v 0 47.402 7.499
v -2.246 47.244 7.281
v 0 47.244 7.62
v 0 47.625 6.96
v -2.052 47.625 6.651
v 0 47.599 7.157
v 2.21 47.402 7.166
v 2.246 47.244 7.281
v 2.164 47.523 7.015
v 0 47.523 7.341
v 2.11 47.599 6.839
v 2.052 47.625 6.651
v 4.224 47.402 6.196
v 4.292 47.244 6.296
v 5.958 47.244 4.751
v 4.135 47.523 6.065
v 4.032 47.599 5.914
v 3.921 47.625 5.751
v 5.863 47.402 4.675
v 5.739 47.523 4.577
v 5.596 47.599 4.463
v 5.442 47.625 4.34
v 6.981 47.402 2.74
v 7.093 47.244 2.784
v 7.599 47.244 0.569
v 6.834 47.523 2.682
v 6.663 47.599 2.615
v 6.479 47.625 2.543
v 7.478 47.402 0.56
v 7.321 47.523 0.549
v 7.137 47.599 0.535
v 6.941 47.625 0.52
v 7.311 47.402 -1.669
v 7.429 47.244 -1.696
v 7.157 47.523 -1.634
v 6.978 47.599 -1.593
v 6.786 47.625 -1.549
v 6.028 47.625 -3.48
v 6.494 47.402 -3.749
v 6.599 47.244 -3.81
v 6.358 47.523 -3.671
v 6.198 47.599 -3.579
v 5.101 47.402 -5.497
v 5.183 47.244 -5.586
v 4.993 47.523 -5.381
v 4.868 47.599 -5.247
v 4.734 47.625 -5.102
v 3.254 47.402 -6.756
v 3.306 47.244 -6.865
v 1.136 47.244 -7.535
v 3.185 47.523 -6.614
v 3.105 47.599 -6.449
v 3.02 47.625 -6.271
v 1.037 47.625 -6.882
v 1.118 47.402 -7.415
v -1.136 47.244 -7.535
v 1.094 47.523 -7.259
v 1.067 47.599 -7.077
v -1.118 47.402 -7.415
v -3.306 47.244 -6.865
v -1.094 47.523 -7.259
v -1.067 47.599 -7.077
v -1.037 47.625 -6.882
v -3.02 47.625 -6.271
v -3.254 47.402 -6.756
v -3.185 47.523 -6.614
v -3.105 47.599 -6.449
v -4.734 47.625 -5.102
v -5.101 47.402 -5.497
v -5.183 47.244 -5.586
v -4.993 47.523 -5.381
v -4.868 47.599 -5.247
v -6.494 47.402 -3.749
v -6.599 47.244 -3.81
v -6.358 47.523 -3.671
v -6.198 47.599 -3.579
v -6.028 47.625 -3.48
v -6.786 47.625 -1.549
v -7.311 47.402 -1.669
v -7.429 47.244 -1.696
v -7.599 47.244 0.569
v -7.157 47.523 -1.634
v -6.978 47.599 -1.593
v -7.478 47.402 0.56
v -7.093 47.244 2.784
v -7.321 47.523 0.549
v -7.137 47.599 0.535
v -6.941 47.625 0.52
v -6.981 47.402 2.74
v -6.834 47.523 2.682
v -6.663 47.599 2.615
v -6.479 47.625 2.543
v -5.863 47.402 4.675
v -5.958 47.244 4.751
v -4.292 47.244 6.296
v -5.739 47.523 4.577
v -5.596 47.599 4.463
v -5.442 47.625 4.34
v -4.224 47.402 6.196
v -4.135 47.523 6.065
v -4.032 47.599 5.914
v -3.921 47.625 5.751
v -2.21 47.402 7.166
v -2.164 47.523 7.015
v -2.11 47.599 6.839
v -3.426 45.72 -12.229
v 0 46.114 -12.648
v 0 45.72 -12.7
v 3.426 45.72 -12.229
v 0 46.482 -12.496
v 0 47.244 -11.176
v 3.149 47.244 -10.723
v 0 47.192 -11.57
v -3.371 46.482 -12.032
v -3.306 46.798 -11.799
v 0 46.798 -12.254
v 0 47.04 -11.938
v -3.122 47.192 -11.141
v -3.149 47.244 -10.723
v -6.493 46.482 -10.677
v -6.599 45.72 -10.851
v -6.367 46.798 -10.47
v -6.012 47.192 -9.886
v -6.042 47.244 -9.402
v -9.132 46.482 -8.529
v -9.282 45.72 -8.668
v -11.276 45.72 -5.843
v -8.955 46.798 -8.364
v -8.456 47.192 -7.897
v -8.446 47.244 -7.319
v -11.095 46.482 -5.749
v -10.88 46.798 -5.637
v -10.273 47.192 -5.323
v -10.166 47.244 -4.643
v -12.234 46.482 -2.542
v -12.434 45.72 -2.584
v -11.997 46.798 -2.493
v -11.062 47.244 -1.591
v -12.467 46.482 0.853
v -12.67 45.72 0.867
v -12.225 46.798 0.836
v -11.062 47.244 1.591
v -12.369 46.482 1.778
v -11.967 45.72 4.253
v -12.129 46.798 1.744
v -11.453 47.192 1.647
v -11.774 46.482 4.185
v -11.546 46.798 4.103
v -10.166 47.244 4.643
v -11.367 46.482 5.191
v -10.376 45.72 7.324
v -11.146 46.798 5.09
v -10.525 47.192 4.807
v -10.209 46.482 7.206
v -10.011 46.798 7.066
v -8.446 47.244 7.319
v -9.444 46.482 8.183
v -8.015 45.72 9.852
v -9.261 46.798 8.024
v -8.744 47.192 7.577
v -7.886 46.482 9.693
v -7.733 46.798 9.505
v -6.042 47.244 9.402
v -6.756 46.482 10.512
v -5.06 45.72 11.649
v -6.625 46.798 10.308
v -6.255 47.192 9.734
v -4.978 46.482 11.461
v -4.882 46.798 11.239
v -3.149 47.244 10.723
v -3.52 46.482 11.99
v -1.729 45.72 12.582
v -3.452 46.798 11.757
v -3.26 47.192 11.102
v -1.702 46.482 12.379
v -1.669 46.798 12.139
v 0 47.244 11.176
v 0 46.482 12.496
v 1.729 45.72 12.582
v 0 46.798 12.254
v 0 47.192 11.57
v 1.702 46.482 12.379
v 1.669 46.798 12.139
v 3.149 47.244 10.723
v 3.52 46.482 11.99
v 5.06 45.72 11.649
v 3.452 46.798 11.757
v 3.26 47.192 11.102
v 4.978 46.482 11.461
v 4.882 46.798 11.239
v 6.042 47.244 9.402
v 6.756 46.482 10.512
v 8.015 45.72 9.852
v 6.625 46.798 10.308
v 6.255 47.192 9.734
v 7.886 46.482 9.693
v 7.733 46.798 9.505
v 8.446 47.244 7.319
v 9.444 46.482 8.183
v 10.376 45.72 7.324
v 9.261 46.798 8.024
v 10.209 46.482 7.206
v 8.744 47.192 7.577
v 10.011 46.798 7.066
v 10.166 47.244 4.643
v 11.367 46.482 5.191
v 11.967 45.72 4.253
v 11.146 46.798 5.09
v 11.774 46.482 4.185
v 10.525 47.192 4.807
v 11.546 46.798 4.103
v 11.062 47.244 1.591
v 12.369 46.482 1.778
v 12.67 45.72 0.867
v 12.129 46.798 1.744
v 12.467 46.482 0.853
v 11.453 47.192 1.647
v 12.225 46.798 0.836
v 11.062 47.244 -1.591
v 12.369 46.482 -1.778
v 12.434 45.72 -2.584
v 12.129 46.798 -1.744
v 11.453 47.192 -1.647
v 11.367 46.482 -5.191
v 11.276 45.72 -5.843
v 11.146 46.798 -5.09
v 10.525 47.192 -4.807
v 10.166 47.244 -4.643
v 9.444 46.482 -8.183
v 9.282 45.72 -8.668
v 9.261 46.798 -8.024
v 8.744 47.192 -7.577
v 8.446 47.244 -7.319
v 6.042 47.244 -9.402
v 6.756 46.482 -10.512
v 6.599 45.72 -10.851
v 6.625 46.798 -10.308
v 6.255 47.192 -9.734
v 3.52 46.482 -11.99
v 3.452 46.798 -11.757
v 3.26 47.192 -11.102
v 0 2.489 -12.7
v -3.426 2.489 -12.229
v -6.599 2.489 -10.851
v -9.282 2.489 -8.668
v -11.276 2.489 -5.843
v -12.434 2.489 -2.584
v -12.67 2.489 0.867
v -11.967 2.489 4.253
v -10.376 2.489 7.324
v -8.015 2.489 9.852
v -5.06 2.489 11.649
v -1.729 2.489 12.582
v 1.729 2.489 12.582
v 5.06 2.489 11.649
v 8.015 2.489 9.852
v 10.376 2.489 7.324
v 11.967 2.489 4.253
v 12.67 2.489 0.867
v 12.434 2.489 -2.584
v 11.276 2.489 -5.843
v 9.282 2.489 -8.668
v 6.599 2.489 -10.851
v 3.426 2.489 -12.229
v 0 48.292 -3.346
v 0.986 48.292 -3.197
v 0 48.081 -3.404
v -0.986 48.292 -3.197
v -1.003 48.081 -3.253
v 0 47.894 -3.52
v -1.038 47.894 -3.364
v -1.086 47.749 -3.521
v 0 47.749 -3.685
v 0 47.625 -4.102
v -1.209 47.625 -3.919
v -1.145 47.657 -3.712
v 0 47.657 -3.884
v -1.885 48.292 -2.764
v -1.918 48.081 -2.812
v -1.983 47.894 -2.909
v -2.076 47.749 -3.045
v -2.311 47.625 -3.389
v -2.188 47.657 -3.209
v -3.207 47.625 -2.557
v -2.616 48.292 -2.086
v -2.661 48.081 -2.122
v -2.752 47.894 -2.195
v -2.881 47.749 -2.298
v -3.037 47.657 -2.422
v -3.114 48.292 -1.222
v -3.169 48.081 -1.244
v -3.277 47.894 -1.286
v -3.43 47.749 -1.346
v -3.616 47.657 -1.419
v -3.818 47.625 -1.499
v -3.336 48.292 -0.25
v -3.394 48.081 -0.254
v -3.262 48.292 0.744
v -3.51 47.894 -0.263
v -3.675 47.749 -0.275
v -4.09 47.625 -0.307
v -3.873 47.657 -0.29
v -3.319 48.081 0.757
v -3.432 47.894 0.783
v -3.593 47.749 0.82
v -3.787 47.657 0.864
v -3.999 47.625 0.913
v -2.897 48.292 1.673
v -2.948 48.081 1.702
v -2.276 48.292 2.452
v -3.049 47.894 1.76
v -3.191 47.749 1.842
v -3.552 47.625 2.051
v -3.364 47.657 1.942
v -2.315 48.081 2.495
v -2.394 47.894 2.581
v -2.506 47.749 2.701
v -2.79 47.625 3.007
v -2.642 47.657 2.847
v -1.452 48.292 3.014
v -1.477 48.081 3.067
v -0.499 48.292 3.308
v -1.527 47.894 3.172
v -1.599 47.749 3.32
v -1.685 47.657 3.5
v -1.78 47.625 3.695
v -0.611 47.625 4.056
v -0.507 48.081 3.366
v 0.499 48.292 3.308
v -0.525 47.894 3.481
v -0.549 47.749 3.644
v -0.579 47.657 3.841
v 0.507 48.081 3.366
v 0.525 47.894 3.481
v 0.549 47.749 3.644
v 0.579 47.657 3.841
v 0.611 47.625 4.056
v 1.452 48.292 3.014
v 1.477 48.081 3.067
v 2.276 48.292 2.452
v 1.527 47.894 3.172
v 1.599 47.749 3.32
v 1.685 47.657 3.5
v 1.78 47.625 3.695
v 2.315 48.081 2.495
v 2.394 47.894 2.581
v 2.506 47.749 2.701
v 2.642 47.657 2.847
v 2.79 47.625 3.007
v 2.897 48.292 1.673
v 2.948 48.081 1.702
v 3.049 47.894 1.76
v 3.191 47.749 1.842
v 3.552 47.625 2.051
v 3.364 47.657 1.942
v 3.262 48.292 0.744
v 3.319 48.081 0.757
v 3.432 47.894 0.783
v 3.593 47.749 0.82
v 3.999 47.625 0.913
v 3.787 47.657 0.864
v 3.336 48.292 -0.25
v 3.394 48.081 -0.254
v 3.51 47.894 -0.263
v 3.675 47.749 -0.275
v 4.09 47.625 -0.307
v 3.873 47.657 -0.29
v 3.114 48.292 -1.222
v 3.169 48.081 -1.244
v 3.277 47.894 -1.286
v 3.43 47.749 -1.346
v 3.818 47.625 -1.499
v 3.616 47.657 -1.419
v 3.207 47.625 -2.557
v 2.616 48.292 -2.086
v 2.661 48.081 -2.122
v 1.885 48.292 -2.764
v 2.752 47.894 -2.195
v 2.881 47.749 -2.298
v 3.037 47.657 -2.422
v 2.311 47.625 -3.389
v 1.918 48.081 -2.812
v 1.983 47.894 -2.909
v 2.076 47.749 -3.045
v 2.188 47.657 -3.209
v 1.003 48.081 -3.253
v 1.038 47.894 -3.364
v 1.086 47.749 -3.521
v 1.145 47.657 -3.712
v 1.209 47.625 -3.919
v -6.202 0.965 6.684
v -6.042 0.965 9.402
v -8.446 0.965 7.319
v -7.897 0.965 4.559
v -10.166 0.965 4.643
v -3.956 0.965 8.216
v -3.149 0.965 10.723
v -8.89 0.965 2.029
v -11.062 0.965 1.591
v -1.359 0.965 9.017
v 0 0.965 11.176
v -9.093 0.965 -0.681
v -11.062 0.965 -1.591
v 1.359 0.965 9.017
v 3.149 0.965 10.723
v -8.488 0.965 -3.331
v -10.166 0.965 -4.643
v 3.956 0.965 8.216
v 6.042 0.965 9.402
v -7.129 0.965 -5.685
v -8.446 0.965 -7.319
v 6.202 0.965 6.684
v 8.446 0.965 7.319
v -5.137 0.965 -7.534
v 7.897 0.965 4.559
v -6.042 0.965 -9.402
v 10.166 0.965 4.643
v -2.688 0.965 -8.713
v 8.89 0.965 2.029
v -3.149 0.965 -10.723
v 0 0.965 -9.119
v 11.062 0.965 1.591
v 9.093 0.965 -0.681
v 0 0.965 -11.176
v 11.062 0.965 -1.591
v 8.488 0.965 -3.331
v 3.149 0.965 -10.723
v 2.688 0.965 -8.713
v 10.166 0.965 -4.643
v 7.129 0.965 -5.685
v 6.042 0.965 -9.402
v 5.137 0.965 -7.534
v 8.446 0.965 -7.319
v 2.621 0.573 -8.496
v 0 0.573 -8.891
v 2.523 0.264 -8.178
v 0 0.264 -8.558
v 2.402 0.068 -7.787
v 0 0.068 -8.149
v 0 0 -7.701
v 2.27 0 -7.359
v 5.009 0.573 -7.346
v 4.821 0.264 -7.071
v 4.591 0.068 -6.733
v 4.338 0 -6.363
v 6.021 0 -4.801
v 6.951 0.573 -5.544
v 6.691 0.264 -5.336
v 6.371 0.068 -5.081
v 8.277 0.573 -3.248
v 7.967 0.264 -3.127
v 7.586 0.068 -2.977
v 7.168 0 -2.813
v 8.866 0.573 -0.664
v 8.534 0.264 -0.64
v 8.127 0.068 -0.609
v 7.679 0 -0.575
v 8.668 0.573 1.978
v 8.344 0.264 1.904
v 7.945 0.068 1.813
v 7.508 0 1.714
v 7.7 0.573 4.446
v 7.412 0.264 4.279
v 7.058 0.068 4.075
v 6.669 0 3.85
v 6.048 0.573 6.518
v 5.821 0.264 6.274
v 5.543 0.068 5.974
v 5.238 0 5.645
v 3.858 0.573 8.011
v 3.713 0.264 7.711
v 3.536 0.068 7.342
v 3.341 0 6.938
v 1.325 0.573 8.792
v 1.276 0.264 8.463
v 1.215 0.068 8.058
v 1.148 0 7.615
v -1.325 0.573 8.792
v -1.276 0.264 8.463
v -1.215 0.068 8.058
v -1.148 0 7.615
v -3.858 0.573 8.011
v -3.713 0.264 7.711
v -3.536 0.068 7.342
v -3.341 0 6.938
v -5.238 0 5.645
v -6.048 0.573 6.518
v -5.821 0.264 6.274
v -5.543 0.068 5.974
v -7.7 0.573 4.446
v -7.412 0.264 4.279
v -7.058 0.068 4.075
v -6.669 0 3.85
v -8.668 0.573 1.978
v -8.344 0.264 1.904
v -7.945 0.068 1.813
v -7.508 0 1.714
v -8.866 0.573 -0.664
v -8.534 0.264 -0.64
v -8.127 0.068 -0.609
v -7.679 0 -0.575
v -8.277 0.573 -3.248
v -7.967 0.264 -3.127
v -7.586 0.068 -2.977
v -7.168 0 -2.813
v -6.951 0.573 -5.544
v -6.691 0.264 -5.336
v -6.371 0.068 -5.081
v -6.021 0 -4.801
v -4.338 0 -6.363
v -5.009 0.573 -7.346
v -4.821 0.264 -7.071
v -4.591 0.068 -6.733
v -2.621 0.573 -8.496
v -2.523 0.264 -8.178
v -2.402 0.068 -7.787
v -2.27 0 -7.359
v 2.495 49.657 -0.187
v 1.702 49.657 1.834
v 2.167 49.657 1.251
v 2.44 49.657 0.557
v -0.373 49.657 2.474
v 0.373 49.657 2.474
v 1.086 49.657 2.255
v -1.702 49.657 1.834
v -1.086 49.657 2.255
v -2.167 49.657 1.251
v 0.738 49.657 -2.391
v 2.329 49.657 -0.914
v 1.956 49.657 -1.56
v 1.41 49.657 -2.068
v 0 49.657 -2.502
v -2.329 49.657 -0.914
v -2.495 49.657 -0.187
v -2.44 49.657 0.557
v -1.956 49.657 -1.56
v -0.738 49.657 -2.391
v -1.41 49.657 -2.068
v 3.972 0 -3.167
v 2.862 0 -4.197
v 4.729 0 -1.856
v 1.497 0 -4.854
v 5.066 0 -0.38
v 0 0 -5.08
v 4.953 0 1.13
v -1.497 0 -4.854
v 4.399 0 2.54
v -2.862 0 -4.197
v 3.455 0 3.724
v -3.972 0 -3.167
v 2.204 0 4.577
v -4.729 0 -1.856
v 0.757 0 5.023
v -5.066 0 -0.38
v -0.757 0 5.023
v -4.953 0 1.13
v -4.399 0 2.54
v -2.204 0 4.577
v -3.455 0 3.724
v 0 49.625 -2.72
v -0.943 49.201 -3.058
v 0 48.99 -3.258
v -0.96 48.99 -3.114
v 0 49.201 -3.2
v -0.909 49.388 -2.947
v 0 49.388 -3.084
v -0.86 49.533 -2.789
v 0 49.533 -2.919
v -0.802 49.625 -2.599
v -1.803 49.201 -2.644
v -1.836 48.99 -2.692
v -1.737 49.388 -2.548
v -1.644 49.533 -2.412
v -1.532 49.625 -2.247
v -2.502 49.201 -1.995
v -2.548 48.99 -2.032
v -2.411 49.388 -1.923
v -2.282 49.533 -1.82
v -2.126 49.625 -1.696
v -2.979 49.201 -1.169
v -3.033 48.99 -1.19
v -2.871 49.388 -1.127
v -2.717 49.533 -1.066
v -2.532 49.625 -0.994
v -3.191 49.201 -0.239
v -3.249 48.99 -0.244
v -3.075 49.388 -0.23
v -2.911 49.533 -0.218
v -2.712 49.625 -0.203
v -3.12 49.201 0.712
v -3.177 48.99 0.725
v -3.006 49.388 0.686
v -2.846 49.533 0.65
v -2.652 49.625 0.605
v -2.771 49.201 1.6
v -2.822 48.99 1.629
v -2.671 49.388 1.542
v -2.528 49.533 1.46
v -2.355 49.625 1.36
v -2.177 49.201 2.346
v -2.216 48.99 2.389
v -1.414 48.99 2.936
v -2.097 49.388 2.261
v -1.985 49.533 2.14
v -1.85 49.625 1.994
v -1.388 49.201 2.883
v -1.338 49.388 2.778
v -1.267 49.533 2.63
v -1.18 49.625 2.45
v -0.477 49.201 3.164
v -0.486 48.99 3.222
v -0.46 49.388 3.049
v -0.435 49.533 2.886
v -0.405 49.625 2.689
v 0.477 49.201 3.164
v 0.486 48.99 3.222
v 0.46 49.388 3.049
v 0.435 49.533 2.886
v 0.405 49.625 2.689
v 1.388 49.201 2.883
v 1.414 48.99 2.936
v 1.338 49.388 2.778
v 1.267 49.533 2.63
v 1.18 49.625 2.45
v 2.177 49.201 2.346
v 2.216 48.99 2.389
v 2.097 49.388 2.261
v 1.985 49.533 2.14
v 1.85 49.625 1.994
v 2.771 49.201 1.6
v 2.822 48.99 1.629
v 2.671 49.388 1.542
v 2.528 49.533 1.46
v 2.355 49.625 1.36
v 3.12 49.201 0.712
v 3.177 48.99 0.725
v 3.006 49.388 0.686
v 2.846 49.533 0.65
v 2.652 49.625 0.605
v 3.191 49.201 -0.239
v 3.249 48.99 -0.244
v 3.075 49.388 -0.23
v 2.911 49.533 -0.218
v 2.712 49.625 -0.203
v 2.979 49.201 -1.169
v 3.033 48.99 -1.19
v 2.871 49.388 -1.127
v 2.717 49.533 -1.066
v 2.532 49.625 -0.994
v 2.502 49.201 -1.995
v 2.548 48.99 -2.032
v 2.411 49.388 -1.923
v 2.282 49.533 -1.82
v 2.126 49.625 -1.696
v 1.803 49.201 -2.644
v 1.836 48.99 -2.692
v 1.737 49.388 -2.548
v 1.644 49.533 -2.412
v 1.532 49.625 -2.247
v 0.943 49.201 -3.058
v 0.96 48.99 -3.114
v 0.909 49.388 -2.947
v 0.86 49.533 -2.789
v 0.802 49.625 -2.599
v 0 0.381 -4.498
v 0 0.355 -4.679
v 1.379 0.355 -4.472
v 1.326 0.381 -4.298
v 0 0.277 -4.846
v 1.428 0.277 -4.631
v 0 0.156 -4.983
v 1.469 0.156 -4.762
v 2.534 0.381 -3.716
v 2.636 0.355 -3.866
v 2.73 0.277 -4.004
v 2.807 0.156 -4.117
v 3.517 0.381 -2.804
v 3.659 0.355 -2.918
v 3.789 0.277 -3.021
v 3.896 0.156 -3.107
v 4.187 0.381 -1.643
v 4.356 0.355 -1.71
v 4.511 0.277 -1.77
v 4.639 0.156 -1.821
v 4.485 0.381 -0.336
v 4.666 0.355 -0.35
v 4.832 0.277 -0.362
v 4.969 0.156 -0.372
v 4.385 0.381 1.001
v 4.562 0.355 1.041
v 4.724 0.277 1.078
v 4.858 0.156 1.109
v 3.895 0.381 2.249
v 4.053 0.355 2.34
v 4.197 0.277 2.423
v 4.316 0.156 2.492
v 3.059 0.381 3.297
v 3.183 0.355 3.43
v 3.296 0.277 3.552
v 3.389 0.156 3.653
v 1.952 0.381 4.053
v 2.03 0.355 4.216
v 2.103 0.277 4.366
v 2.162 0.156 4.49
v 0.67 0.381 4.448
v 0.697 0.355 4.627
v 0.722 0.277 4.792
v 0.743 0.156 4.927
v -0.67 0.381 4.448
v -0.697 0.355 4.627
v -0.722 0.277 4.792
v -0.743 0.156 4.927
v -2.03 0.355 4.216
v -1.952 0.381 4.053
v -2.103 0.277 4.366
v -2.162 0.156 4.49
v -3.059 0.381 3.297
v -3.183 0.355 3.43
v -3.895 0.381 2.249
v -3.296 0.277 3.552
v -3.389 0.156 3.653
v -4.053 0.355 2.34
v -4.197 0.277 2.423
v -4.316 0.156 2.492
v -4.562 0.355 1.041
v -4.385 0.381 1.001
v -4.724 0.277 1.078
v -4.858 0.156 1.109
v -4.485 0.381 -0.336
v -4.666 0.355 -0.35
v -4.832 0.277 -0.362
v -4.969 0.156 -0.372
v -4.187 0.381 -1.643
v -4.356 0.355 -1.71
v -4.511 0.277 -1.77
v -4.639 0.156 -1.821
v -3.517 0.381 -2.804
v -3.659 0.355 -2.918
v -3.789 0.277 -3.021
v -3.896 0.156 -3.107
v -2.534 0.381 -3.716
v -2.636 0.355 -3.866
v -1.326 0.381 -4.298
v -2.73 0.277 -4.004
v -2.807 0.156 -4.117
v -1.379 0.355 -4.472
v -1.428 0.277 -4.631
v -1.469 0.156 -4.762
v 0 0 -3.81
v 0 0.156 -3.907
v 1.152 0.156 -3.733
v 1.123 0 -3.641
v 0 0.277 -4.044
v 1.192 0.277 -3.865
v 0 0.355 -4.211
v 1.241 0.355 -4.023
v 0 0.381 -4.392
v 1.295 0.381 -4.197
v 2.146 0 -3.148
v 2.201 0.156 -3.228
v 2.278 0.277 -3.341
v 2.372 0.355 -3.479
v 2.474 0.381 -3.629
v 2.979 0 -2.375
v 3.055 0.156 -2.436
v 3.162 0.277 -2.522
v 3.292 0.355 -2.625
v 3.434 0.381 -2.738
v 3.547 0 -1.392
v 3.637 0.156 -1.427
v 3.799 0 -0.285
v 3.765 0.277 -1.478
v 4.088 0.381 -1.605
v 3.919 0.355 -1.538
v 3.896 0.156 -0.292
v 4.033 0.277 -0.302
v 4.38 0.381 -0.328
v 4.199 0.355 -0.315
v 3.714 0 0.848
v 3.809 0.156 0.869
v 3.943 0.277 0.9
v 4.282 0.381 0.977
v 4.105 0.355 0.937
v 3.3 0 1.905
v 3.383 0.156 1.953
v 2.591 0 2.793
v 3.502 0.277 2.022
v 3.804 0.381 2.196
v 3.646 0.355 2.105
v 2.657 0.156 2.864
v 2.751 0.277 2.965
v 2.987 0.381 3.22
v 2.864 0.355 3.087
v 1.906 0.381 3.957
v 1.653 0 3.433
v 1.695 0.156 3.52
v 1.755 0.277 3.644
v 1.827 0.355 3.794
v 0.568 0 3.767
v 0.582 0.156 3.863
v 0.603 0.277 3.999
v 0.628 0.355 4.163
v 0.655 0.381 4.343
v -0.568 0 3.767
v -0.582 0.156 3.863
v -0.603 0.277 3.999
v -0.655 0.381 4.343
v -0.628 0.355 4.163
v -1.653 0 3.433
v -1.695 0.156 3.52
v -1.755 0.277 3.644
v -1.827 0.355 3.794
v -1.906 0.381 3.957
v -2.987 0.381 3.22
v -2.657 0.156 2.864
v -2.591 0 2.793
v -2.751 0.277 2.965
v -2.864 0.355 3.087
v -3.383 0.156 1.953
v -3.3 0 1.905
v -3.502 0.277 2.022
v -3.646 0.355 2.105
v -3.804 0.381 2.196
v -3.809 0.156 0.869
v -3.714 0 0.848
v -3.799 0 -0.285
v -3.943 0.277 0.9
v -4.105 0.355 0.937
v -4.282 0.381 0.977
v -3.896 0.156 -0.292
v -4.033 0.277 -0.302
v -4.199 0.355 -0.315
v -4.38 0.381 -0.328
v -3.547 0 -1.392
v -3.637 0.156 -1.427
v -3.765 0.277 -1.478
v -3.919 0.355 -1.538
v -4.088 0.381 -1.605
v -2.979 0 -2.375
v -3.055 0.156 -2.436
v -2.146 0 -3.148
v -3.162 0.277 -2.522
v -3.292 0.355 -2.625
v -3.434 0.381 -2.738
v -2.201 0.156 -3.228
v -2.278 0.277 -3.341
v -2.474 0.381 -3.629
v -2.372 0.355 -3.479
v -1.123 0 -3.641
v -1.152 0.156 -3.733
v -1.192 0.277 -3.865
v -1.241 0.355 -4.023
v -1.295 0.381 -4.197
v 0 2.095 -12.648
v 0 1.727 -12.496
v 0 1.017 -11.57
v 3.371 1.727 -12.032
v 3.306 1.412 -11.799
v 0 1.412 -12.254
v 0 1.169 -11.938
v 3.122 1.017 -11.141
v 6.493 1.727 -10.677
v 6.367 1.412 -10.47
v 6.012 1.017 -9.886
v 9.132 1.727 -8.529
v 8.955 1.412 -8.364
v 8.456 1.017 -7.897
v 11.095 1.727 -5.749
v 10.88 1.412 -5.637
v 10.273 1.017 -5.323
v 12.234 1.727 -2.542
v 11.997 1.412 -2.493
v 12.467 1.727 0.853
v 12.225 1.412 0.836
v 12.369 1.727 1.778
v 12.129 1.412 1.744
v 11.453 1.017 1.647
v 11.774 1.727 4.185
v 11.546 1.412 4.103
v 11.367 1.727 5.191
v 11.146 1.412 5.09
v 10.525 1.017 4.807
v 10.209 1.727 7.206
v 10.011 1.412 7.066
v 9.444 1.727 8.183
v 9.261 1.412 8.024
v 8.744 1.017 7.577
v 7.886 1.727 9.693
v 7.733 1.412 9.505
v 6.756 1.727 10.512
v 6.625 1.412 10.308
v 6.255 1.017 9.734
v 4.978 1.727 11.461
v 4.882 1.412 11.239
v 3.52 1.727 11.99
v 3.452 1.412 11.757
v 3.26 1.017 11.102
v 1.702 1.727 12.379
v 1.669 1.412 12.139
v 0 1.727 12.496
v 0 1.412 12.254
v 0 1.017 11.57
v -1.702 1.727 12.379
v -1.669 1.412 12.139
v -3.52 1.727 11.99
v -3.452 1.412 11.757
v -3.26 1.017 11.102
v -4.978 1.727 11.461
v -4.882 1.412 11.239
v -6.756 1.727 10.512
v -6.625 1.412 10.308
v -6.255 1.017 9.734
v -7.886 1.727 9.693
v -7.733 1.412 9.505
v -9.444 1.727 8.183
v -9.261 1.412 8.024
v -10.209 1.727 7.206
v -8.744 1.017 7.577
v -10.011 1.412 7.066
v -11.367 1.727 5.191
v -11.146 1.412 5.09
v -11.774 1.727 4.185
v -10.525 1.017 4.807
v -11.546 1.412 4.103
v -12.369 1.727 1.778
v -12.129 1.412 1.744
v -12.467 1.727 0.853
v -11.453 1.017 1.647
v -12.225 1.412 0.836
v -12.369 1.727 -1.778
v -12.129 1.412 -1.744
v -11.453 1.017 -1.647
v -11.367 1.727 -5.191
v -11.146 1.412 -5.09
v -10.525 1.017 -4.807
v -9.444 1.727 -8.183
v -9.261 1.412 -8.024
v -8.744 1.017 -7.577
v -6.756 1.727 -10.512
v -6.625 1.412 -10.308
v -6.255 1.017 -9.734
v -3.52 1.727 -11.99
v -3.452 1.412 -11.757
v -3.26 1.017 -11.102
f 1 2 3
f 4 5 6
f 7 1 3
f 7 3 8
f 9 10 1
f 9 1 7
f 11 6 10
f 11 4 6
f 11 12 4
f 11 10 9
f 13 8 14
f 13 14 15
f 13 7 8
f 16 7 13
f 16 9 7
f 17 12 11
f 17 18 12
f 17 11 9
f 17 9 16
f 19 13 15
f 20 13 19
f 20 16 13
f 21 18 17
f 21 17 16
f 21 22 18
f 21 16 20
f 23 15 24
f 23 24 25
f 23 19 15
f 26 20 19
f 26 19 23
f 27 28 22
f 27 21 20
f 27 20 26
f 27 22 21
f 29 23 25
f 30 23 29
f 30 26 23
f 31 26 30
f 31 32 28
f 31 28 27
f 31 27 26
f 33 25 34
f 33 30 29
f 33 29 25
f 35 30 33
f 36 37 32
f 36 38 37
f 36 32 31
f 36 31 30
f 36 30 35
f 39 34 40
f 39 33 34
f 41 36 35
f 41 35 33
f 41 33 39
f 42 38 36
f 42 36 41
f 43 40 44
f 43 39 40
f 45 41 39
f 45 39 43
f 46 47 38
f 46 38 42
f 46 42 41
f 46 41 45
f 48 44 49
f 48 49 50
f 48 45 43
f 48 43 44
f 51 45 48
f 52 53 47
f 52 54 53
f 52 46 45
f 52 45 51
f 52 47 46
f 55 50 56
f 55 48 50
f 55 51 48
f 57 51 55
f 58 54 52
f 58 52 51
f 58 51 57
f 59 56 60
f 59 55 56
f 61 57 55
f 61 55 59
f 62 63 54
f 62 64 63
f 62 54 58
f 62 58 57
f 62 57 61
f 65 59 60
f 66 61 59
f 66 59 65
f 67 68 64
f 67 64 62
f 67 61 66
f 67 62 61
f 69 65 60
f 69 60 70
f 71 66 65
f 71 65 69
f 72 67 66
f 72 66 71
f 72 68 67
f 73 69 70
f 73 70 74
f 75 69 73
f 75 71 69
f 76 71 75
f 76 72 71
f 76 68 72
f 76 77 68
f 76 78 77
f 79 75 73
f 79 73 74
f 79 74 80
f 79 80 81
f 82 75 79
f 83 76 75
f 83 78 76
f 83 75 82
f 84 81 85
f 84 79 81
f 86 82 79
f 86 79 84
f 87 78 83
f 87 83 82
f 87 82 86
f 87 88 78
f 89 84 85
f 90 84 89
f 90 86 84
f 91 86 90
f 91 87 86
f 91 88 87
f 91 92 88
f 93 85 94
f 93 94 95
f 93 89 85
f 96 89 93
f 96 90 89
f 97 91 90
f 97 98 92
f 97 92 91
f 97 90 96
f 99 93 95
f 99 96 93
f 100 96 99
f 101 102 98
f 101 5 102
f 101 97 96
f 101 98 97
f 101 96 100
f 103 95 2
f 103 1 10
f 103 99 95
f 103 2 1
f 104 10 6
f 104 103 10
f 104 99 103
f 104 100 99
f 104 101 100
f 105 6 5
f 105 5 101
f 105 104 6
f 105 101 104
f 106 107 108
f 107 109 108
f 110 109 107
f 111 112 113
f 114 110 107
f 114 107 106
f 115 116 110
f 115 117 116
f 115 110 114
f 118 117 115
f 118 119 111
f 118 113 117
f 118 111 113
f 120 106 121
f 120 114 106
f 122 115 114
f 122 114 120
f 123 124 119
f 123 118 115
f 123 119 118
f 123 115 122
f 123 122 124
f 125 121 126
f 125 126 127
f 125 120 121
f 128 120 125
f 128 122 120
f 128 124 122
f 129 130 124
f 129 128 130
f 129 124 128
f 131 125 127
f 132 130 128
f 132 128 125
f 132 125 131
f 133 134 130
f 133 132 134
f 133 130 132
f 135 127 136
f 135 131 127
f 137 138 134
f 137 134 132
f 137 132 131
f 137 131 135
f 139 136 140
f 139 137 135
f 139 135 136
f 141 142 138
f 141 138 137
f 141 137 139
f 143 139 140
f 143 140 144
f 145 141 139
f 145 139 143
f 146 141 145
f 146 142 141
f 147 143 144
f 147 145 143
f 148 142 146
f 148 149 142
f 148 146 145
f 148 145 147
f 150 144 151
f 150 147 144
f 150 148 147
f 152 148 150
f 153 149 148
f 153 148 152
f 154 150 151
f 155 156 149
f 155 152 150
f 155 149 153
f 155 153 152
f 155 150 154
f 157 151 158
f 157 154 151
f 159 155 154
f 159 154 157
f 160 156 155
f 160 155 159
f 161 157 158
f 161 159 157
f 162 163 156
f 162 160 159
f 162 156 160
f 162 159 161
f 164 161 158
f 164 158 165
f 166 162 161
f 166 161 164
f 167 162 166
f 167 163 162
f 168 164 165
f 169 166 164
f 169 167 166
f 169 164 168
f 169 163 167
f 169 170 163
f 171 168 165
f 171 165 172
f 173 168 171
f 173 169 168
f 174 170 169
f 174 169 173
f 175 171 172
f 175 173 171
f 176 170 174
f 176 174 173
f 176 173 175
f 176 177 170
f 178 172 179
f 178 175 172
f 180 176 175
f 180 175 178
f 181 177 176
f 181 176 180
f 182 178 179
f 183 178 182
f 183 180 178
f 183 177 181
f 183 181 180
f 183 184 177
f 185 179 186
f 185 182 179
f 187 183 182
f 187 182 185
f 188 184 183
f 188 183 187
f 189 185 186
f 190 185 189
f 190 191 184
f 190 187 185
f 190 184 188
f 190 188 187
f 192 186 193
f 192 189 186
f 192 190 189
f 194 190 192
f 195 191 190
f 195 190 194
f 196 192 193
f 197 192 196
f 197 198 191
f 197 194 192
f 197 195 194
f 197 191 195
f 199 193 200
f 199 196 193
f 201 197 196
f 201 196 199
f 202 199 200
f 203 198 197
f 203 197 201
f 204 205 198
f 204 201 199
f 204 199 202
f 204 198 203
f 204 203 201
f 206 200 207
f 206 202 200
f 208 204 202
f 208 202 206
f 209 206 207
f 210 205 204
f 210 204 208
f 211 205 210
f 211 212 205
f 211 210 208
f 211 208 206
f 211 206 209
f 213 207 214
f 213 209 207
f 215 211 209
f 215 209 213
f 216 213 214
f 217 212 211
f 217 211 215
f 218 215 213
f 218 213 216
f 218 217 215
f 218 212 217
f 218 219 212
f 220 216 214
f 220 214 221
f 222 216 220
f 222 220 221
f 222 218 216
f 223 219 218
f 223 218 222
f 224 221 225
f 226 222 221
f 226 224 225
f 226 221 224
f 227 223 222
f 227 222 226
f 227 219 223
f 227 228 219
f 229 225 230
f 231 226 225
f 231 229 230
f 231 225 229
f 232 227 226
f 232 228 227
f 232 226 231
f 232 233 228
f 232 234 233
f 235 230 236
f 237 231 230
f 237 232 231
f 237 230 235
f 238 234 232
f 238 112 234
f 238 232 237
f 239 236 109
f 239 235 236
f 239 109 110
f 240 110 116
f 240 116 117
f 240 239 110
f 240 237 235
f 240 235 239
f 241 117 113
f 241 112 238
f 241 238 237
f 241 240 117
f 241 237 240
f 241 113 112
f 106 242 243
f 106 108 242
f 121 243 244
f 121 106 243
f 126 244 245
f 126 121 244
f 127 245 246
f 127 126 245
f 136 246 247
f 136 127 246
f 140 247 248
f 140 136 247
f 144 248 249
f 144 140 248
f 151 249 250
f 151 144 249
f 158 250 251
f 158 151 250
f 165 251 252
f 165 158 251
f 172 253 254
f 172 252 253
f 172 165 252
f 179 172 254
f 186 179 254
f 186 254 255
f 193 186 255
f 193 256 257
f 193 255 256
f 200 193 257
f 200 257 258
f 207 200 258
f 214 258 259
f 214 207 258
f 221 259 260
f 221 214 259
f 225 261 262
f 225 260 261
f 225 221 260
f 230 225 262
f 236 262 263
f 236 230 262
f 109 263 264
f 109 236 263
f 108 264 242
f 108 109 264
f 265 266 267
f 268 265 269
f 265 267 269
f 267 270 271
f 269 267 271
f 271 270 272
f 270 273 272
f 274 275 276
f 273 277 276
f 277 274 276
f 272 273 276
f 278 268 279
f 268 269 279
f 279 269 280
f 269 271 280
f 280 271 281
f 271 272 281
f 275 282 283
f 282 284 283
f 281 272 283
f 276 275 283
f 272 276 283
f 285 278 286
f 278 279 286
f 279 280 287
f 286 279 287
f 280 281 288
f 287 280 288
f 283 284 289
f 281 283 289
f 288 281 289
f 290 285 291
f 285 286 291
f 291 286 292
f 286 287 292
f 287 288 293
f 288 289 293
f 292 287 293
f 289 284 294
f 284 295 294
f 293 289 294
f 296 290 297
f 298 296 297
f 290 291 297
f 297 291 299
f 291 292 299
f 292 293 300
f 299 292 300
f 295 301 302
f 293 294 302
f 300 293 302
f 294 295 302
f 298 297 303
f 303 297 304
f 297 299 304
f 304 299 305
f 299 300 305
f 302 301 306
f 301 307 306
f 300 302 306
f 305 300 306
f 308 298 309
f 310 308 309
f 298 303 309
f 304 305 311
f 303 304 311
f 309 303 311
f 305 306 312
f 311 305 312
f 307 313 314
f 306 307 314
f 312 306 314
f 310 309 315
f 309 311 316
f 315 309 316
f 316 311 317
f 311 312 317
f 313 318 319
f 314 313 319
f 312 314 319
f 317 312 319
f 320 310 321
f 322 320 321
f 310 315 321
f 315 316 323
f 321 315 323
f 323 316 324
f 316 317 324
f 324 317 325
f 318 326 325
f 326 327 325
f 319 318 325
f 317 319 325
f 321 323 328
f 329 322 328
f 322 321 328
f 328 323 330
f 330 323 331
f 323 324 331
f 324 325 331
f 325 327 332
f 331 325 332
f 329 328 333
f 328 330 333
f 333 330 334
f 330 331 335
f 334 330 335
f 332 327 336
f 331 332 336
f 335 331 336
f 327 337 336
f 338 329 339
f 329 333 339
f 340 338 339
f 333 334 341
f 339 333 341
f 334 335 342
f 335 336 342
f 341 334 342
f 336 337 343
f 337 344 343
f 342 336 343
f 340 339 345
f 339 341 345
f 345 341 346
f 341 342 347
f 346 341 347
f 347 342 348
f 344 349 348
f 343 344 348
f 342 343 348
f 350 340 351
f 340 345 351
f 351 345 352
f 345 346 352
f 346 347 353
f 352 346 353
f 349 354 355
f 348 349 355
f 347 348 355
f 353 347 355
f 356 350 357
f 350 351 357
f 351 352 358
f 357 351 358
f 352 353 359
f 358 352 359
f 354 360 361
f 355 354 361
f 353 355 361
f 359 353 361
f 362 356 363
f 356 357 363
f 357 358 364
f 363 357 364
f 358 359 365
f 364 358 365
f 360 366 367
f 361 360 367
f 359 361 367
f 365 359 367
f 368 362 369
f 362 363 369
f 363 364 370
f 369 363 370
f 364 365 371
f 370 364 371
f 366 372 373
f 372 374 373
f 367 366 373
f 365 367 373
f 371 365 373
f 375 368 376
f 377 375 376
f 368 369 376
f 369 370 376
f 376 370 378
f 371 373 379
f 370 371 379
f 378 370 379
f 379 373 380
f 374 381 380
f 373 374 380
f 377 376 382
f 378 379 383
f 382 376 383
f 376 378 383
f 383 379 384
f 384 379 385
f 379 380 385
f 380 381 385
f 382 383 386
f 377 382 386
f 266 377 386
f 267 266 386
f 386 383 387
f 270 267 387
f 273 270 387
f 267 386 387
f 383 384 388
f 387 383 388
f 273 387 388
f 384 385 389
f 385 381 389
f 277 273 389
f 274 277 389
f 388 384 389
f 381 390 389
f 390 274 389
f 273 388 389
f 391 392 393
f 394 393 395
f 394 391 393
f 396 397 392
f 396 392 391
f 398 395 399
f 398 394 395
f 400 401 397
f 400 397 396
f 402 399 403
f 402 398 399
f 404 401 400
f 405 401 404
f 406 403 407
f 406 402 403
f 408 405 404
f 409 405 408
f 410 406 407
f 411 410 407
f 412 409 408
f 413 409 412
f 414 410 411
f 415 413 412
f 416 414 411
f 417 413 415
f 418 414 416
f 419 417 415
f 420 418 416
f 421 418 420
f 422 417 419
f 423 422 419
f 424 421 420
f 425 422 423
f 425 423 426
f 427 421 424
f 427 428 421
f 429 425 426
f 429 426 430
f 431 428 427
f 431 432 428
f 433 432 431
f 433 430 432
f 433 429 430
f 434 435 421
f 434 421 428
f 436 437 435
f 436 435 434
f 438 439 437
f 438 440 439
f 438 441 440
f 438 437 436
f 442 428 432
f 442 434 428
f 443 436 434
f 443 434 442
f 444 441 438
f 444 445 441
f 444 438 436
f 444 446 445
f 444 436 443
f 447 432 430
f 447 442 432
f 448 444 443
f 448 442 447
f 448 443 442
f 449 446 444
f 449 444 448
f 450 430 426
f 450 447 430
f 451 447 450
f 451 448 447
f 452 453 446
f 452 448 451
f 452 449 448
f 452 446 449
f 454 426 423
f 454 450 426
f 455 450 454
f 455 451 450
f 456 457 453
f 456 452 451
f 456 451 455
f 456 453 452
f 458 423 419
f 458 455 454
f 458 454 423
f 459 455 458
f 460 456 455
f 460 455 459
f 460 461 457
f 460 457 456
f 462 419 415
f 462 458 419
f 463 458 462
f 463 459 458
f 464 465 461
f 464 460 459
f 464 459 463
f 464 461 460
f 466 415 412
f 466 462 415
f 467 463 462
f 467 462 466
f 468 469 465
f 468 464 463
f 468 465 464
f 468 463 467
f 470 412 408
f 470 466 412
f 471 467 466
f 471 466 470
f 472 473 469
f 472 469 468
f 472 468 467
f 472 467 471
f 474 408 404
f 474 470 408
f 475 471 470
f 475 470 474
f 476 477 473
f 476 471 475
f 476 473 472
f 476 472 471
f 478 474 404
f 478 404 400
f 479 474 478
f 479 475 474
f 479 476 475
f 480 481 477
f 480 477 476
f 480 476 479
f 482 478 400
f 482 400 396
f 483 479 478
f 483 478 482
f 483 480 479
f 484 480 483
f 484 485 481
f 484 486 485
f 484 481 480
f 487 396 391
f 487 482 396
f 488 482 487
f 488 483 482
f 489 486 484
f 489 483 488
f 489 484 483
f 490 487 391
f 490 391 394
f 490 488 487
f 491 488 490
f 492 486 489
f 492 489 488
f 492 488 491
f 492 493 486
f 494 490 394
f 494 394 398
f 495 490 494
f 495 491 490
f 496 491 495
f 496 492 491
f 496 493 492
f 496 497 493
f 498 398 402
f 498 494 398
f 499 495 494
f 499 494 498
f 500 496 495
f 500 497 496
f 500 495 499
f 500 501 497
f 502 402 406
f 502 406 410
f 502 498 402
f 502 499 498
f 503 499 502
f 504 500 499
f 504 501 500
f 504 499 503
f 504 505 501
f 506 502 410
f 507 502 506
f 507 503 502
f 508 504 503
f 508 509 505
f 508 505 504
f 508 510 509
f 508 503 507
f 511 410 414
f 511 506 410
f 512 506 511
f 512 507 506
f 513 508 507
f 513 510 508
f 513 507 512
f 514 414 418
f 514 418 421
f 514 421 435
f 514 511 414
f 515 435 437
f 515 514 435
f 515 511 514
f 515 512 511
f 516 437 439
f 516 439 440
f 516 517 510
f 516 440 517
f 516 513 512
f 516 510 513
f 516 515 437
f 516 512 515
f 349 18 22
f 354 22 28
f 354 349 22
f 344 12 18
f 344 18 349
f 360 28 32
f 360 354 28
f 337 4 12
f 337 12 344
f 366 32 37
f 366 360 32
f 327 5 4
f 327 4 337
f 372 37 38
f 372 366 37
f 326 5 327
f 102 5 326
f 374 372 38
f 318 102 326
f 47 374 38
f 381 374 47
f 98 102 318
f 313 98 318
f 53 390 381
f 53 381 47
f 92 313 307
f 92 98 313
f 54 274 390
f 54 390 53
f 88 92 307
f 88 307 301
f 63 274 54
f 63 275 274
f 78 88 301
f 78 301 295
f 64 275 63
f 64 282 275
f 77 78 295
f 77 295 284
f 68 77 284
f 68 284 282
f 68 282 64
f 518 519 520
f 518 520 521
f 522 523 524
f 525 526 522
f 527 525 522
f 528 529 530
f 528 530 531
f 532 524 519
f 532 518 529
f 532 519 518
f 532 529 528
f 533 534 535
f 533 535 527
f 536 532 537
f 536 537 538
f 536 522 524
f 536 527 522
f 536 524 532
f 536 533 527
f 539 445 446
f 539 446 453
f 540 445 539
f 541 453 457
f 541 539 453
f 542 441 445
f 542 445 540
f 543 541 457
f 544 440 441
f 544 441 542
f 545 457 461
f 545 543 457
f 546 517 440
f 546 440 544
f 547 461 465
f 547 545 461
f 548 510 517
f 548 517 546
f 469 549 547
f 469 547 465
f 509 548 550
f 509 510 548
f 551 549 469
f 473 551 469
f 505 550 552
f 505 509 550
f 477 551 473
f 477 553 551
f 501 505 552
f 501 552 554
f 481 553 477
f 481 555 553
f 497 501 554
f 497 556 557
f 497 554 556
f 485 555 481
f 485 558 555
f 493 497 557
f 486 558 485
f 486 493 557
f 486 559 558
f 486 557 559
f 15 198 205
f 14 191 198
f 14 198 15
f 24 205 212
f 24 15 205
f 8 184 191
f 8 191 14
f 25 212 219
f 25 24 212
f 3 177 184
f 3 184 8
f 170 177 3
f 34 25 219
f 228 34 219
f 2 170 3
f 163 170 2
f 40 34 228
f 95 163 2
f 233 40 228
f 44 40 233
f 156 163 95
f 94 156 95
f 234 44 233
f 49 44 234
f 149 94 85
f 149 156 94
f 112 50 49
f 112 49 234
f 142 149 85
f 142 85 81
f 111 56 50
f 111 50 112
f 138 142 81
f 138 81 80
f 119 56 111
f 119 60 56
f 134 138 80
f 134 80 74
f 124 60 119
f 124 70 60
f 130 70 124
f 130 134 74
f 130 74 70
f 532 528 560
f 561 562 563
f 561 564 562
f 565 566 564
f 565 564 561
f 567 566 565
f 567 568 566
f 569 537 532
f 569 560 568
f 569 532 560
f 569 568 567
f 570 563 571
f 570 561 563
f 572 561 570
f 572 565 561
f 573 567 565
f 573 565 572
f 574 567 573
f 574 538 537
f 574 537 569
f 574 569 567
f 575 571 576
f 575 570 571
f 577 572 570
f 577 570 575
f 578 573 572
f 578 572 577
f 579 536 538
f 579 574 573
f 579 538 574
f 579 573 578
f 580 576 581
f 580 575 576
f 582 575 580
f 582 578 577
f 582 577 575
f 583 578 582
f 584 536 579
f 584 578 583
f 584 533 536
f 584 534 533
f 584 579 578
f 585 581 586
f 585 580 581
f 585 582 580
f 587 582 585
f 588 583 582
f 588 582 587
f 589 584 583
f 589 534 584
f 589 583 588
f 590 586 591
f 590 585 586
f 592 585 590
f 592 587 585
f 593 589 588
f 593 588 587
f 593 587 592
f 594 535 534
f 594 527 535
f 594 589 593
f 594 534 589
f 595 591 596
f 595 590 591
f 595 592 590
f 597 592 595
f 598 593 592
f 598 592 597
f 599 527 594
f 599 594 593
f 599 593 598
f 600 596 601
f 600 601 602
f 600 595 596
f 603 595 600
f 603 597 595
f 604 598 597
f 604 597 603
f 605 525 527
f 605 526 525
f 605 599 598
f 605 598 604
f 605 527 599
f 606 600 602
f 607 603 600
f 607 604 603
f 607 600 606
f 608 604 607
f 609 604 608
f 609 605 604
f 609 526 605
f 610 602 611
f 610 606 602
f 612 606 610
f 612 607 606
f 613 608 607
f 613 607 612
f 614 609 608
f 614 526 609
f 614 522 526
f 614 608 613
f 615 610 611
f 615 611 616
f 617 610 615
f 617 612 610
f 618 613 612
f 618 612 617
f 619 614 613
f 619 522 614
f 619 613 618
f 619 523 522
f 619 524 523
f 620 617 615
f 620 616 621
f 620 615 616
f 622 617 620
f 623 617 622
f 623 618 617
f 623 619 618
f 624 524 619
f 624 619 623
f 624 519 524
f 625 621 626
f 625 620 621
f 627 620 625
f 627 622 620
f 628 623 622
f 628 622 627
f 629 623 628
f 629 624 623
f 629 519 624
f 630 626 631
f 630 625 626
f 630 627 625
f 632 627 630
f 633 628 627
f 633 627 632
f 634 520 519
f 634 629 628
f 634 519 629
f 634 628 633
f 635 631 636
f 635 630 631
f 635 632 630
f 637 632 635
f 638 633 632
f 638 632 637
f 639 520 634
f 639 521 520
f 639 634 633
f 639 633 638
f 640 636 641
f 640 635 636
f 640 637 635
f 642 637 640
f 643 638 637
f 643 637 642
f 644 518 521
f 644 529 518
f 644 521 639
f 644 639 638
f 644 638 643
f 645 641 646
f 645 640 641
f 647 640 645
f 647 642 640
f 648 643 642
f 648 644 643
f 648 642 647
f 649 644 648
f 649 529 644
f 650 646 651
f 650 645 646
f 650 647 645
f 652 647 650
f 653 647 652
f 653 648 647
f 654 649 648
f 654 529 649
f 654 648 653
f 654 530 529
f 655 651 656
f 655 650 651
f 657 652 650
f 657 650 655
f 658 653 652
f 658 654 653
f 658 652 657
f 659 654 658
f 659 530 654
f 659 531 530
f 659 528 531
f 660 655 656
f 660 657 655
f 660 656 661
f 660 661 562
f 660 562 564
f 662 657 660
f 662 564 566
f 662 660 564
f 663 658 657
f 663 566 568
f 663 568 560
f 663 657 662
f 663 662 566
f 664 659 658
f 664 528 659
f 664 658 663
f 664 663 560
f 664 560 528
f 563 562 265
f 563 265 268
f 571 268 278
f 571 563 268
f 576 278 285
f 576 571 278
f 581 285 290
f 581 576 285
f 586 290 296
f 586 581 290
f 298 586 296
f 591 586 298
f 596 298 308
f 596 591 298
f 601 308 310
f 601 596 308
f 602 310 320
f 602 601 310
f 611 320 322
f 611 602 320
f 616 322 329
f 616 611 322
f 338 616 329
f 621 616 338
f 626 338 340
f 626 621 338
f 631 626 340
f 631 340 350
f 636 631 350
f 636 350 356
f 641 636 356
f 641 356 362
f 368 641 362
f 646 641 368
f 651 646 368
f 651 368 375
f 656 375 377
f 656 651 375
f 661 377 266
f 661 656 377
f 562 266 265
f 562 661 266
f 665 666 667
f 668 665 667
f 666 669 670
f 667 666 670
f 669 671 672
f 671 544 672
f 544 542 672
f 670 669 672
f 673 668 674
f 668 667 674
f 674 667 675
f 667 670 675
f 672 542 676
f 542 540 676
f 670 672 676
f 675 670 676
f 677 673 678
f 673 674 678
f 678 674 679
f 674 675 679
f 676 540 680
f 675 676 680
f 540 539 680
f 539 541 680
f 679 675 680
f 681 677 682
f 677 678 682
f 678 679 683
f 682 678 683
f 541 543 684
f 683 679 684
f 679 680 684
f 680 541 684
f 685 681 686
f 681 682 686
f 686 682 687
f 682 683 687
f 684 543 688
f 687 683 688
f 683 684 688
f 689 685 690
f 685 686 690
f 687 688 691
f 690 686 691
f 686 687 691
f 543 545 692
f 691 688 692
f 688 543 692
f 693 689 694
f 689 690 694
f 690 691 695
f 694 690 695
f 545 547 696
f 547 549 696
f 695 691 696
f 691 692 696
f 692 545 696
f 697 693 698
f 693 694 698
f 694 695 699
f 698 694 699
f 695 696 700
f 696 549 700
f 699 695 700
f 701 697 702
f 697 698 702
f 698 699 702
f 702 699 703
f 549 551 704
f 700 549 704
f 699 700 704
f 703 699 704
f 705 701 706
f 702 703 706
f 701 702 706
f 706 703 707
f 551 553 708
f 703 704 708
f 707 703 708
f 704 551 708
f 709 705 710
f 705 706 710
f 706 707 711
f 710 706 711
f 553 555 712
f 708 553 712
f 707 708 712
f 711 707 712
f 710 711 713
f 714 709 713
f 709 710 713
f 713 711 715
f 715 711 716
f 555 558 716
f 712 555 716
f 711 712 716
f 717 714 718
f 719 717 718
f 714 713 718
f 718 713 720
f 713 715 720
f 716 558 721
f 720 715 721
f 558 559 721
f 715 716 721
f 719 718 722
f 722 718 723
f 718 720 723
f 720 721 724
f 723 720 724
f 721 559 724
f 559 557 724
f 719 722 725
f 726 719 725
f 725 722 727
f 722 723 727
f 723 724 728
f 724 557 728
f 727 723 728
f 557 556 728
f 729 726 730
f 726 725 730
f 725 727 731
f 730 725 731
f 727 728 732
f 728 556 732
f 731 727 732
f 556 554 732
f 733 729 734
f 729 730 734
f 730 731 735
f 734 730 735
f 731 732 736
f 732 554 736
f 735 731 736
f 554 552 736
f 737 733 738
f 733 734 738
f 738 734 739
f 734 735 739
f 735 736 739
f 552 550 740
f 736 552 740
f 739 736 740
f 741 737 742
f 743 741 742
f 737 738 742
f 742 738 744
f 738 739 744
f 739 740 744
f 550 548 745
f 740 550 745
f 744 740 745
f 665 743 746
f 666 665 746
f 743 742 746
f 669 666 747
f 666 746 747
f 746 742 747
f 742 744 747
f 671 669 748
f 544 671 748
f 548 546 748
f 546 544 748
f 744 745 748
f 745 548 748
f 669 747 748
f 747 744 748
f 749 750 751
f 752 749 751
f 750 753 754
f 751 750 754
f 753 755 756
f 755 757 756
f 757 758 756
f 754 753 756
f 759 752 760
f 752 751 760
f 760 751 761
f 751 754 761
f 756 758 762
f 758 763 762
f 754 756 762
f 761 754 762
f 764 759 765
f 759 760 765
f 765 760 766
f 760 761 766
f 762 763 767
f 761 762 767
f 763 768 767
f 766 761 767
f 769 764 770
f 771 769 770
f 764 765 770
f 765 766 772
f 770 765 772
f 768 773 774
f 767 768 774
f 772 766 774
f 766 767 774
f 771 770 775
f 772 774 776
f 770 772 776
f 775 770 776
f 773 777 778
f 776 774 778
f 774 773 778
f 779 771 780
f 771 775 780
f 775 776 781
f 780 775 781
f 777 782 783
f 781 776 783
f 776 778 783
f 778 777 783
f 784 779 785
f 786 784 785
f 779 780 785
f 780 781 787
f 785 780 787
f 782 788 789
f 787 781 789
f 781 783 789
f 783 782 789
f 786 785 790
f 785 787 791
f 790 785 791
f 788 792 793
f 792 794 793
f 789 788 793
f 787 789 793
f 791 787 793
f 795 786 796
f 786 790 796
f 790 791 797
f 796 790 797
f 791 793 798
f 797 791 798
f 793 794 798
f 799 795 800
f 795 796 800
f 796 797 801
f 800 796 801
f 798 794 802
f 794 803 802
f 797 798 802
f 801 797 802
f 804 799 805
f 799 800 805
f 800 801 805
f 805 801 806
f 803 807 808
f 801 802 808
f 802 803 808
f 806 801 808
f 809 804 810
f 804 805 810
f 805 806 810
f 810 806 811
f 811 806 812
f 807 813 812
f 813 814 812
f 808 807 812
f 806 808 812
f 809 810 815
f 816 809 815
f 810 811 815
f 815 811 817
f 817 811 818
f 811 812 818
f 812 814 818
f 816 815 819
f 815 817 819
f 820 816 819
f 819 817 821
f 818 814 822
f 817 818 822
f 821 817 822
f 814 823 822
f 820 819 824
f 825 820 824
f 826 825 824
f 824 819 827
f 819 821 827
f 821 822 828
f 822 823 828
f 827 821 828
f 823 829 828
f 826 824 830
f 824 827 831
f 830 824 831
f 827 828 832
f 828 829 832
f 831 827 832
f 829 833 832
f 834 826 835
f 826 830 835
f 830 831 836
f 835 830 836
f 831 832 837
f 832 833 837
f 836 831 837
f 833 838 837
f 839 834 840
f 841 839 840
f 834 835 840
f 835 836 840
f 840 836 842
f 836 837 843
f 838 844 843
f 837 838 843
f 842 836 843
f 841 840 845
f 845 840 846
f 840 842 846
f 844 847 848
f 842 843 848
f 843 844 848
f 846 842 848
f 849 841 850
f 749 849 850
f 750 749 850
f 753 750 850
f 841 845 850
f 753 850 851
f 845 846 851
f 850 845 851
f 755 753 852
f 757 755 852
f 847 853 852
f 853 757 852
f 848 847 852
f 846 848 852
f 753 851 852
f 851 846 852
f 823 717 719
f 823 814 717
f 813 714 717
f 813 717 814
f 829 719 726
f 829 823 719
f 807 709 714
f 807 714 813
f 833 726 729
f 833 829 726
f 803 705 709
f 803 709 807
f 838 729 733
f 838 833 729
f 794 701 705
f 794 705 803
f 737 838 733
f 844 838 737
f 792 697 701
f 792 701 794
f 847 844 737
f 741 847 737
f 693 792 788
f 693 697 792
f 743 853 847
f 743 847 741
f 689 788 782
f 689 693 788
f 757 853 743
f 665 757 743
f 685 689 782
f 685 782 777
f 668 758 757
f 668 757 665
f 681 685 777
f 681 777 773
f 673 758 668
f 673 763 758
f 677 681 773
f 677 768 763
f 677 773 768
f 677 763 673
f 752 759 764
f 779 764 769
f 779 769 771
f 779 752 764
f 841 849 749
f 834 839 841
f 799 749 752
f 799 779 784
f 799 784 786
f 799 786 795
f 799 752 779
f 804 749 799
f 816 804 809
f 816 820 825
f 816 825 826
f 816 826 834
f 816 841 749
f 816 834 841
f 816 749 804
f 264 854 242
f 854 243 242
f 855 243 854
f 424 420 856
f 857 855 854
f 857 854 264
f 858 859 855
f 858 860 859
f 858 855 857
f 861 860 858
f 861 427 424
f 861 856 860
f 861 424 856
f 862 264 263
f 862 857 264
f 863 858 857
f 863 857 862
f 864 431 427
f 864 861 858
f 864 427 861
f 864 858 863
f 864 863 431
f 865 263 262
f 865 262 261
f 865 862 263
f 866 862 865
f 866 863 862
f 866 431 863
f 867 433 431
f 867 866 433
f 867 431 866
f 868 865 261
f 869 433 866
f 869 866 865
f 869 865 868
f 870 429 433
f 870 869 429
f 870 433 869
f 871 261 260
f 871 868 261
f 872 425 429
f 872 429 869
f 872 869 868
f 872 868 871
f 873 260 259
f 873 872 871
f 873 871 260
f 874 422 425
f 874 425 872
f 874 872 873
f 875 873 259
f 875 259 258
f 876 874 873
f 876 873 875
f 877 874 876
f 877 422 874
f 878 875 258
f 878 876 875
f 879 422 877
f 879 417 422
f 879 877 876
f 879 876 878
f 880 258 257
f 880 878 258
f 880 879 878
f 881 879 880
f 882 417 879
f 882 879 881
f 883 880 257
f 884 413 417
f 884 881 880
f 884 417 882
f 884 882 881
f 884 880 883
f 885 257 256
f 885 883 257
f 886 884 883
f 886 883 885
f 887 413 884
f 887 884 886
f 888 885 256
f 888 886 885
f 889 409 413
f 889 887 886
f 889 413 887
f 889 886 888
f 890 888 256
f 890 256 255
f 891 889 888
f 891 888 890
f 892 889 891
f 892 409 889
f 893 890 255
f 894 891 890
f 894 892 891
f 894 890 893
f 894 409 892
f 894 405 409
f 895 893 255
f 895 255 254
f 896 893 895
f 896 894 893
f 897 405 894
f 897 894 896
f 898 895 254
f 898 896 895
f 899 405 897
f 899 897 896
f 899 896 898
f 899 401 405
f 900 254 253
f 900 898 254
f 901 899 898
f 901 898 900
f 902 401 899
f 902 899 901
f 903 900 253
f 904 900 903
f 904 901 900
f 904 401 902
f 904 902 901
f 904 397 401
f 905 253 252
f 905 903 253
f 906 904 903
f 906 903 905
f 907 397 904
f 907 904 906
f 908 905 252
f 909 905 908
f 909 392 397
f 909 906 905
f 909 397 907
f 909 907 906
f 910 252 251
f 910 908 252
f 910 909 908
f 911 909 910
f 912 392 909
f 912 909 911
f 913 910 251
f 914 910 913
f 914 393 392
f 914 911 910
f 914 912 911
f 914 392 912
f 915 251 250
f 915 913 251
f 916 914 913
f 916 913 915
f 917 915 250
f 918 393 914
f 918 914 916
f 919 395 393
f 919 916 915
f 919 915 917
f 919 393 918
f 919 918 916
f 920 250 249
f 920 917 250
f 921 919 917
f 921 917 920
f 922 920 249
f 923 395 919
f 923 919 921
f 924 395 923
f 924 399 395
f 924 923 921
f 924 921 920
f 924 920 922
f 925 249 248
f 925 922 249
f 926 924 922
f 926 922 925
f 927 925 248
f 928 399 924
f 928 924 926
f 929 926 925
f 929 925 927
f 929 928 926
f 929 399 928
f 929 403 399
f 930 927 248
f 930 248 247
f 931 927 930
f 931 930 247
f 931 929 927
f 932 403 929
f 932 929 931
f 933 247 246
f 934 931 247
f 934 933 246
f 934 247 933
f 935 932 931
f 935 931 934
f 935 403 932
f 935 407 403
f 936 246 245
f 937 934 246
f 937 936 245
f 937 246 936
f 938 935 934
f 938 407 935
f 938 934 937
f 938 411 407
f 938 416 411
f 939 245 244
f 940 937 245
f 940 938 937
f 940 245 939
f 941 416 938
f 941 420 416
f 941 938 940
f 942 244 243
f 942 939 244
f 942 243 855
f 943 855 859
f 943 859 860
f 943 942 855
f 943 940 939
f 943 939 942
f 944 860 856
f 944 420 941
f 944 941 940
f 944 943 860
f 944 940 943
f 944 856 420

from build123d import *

# Parameters (mm, degrees)
SKETCH2_R      = 12.7
SKETCH2_R_2    = 7.62
EXTRUDE1_DEPTH = 0.381
EXTRUDE2_START = -0.9652
SKETCH3_R      = 12.7
SKETCH3_R_2    = 9.1186
EXTRUDE2_DEPTH = 0.9652
SKETCH4_R      = 5.08
SKETCH4_R_2    = 3.81
EXTRUDE3_DEPTH = 0.381
FILLET1_R      = 1.524
FILLET2_R      = 0.762
FILLET3_R      = 0.635


with BuildPart() as part:
    # Sketch1 → Revolve1 (revolve)
    with BuildSketch(Plane.XY, mode=Mode.PRIVATE) as revolve1_sk:
        Polygon((0, 0), (-12.7, 0), (-12.7, 47.625), (-3.429, 47.625), (-3.175, 49.657), (0, 49.657), align=None)
    revolve(revolve1_sk.sketch.rotate(Axis((0, 0, 0), (0, 1, 0)), 270), axis=Axis((0, 0, 0), (0, 1, 0)))

    # Sketch2 → Extrude1 (cut)
    with BuildSketch(Plane(origin=(0, 47.625, 0), x_dir=(1, 0, 0), z_dir=(0, 1, 0))):
        with Locations(Location((0, 0, 0), (0, 0, 90))):
            Circle(SKETCH2_R)
        with Locations(Location((0, 0, 0), (0, 0, 270))):
            Circle(SKETCH2_R_2, mode=Mode.SUBTRACT)
    extrude(amount=-EXTRUDE1_DEPTH, mode=Mode.SUBTRACT)

    # Sketch3 → Extrude2 (cut)
    with BuildSketch(Plane.XZ.offset(EXTRUDE2_START)):
        with Locations(Location((0, 0, 0), (0, 0, 270))):
            Circle(SKETCH3_R)
        with Locations(Location((0, 0, 0), (0, 0, 270))):
            Circle(SKETCH3_R_2, mode=Mode.SUBTRACT)
    extrude(amount=EXTRUDE2_DEPTH, mode=Mode.SUBTRACT)

    # Sketch4 → Extrude3 (cut)
    with BuildSketch(Plane.XZ):
        with Locations(Location((0, 0, 0), (0, 0, 270))):
            Circle(SKETCH4_R)
        with Locations(Location((0, 0, 0), (0, 0, 270))):
            Circle(SKETCH4_R_2, mode=Mode.SUBTRACT)
    extrude(amount=-EXTRUDE3_DEPTH, mode=Mode.SUBTRACT)

    # Fillet1
    # the kernel refuses this fillet: 1.524 mm, written as the material it takes off along each edge
    with BuildSketch(Plane(origin=(0, 47.244, 0), x_dir=(0, 0, -1), z_dir=(1, 0, 0))) as fillet1_piece_1:
        with BuildLine():
            CenterArc((12.7 - FILLET1_R, -FILLET1_R), FILLET1_R, 0, 90)
            Line((12.7 - FILLET1_R, 0), (12.7 - FILLET1_R, FILLET1_R * 0.02))
            Line((12.7 - FILLET1_R, FILLET1_R * 0.02), (12.7 + FILLET1_R * 0.02, FILLET1_R * 0.02))
            Line((12.7 + FILLET1_R * 0.02, FILLET1_R * 0.02), (12.7 + FILLET1_R * 0.02, -FILLET1_R))
            Line((12.7 + FILLET1_R * 0.02, -FILLET1_R), (12.7, -FILLET1_R))
        make_face()
    revolve(axis=Axis((0, 47.244, 0), (0, 1, 0)), mode=Mode.SUBTRACT)
    with BuildSketch(Plane(origin=(0, 0.9652, 0), x_dir=(0, 0, -1), z_dir=(-1, 0, 0))) as fillet1_piece_2:
        with BuildLine():
            CenterArc((12.7 - FILLET1_R, -FILLET1_R), FILLET1_R, 0, 90)
            Line((12.7, -FILLET1_R), (12.7 + FILLET1_R * 0.02, -FILLET1_R))
            Line((12.7 + FILLET1_R * 0.02, -FILLET1_R), (12.7 + FILLET1_R * 0.02, FILLET1_R * 0.02))
            Line((12.7 + FILLET1_R * 0.02, FILLET1_R * 0.02), (12.7 - FILLET1_R, FILLET1_R * 0.02))
            Line((12.7 - FILLET1_R, FILLET1_R * 0.02), (12.7 - FILLET1_R, 0))
        make_face()
    revolve(axis=Axis((0, 0.9652, 0), (0, -1, 0)), mode=Mode.SUBTRACT)
    with BuildSketch(Plane(origin=(0, 0, 0), x_dir=(0, 0, -1), z_dir=(-1, 0, 0))) as fillet1_piece_3:
        with BuildLine():
            CenterArc((7.700742969, -1.524), FILLET1_R, 21.510188267, 68.489811733)
            Line((9.1186, -0.9652), (9.146957141, -0.954024))
            ThreePointArc((9.146957141, -0.954024), (9.14908, -0.4826), (9.14908, 0))
            Line((9.14908, 0), (9.1186, 0.03048))
            Line((9.1186, 0.03048), (7.700742969, 0.03048))
            Line((7.700742969, 0.03048), (7.700742969, 0))
        make_face()
    revolve(axis=Axis((0, 0, 0), (0, -1, 0)), mode=Mode.SUBTRACT)

    # Fillet2
    # the kernel refuses this fillet: 0.762 mm, written as the material it adds along each edge
    with BuildSketch(Plane(origin=(0, 47.625, 0), x_dir=(0, 0, -1), z_dir=(1, 0, 0))) as fillet2_piece_1:
        with BuildLine():
            CenterArc((3.429 + FILLET2_R * 0.882782218537, FILLET2_R), FILLET2_R, 187.125016349, 82.874983651)
            Line((3.429 - FILLET2_R * 0.109495658176, FILLET2_R * 0.875965265411), (3.429, 0))
            Line((3.429, 0), (3.429 + FILLET2_R * 0.882782218537, 0))
        make_face()
    revolve(axis=Axis((0, 47.625, 0), (0, 1, 0)))
    # the kernel refuses this fillet: 0.762 mm, written as the material it takes off along each edge
    with BuildSketch(Plane(origin=(0, 47.625, 0), x_dir=(0, 0, 1), z_dir=(-1, 0, 0))) as fillet2_2_piece_1:
        with BuildLine():
            CenterArc((6.960088642, -0.762), FILLET2_R, 30, 60)
            Line((6.960088642, 0), (7.62, 0))
            Line((7.62, 0), (7.62, -0.381))
        make_face()
    revolve(axis=Axis((0, 47.625, 0), (0, 1, 0)), mode=Mode.SUBTRACT)
    with BuildSketch(Plane(origin=(0, 49.657, 0), x_dir=(0, 0, -1), z_dir=(1, 0, 0))) as fillet2_2_piece_2:
        with BuildLine():
            CenterArc((3.175 - FILLET2_R * 0.882782218537, -FILLET2_R), FILLET2_R, 7.125016349, 82.874983651)
            Line((3.175 - FILLET2_R * 0.882782218537, 0), (3.175, 0))
            Line((3.175, 0), (3.175 + FILLET2_R * 0.109495658176, -FILLET2_R * 0.875965265411))
        make_face()
    revolve(axis=Axis((0, 49.657, 0), (0, 1, 0)), mode=Mode.SUBTRACT)

    # Fillet3
    # the kernel refuses this fillet: 0.635 mm, written as the material it adds along each edge
    with BuildSketch(Plane(origin=(0, 0.381, 0), x_dir=(0, 0, -1), z_dir=(-1, 0, 0))) as fillet3_piece_1:
        with BuildLine():
            CenterArc((4.498012887, 0.635), FILLET3_R, 270, 66.421821522)
            Line((4.498012887, 0), (4.498012887, -0.0127))
            Line((4.498012887, -0.0127), (5.08, -0.0127))
            Line((5.08, -0.0127), (5.0927, 0))
            ThreePointArc((5.0927, 0), (5.0927, 0.1905), (5.091639742, 0.37592))
            Line((5.091639742, 0.37592), (5.08, 0.381))
        make_face()
    revolve(axis=Axis((0, 0.381, 0), (0, -1, 0)))
    with BuildSketch(Plane(origin=(0, 0.381, 0), x_dir=(0, 0, -1), z_dir=(-1, 0, 0))) as fillet3_piece_2:
        with BuildLine():
            CenterArc((4.391987113, 0.635), FILLET3_R, 203.578178478, 66.421821522)
            Line((3.81, 0.381), (3.798360258, 0.37592))
            ThreePointArc((3.798360258, 0.37592), (3.7973, 0.1905), (3.7973, 0))
            Line((3.7973, 0), (3.81, -0.0127))
            Line((3.81, -0.0127), (4.391987113, -0.0127))
            Line((4.391987113, -0.0127), (4.391987113, 0))
        make_face()
    revolve(axis=Axis((0, 0.381, 0), (0, -1, 0)))


solid = part.part
